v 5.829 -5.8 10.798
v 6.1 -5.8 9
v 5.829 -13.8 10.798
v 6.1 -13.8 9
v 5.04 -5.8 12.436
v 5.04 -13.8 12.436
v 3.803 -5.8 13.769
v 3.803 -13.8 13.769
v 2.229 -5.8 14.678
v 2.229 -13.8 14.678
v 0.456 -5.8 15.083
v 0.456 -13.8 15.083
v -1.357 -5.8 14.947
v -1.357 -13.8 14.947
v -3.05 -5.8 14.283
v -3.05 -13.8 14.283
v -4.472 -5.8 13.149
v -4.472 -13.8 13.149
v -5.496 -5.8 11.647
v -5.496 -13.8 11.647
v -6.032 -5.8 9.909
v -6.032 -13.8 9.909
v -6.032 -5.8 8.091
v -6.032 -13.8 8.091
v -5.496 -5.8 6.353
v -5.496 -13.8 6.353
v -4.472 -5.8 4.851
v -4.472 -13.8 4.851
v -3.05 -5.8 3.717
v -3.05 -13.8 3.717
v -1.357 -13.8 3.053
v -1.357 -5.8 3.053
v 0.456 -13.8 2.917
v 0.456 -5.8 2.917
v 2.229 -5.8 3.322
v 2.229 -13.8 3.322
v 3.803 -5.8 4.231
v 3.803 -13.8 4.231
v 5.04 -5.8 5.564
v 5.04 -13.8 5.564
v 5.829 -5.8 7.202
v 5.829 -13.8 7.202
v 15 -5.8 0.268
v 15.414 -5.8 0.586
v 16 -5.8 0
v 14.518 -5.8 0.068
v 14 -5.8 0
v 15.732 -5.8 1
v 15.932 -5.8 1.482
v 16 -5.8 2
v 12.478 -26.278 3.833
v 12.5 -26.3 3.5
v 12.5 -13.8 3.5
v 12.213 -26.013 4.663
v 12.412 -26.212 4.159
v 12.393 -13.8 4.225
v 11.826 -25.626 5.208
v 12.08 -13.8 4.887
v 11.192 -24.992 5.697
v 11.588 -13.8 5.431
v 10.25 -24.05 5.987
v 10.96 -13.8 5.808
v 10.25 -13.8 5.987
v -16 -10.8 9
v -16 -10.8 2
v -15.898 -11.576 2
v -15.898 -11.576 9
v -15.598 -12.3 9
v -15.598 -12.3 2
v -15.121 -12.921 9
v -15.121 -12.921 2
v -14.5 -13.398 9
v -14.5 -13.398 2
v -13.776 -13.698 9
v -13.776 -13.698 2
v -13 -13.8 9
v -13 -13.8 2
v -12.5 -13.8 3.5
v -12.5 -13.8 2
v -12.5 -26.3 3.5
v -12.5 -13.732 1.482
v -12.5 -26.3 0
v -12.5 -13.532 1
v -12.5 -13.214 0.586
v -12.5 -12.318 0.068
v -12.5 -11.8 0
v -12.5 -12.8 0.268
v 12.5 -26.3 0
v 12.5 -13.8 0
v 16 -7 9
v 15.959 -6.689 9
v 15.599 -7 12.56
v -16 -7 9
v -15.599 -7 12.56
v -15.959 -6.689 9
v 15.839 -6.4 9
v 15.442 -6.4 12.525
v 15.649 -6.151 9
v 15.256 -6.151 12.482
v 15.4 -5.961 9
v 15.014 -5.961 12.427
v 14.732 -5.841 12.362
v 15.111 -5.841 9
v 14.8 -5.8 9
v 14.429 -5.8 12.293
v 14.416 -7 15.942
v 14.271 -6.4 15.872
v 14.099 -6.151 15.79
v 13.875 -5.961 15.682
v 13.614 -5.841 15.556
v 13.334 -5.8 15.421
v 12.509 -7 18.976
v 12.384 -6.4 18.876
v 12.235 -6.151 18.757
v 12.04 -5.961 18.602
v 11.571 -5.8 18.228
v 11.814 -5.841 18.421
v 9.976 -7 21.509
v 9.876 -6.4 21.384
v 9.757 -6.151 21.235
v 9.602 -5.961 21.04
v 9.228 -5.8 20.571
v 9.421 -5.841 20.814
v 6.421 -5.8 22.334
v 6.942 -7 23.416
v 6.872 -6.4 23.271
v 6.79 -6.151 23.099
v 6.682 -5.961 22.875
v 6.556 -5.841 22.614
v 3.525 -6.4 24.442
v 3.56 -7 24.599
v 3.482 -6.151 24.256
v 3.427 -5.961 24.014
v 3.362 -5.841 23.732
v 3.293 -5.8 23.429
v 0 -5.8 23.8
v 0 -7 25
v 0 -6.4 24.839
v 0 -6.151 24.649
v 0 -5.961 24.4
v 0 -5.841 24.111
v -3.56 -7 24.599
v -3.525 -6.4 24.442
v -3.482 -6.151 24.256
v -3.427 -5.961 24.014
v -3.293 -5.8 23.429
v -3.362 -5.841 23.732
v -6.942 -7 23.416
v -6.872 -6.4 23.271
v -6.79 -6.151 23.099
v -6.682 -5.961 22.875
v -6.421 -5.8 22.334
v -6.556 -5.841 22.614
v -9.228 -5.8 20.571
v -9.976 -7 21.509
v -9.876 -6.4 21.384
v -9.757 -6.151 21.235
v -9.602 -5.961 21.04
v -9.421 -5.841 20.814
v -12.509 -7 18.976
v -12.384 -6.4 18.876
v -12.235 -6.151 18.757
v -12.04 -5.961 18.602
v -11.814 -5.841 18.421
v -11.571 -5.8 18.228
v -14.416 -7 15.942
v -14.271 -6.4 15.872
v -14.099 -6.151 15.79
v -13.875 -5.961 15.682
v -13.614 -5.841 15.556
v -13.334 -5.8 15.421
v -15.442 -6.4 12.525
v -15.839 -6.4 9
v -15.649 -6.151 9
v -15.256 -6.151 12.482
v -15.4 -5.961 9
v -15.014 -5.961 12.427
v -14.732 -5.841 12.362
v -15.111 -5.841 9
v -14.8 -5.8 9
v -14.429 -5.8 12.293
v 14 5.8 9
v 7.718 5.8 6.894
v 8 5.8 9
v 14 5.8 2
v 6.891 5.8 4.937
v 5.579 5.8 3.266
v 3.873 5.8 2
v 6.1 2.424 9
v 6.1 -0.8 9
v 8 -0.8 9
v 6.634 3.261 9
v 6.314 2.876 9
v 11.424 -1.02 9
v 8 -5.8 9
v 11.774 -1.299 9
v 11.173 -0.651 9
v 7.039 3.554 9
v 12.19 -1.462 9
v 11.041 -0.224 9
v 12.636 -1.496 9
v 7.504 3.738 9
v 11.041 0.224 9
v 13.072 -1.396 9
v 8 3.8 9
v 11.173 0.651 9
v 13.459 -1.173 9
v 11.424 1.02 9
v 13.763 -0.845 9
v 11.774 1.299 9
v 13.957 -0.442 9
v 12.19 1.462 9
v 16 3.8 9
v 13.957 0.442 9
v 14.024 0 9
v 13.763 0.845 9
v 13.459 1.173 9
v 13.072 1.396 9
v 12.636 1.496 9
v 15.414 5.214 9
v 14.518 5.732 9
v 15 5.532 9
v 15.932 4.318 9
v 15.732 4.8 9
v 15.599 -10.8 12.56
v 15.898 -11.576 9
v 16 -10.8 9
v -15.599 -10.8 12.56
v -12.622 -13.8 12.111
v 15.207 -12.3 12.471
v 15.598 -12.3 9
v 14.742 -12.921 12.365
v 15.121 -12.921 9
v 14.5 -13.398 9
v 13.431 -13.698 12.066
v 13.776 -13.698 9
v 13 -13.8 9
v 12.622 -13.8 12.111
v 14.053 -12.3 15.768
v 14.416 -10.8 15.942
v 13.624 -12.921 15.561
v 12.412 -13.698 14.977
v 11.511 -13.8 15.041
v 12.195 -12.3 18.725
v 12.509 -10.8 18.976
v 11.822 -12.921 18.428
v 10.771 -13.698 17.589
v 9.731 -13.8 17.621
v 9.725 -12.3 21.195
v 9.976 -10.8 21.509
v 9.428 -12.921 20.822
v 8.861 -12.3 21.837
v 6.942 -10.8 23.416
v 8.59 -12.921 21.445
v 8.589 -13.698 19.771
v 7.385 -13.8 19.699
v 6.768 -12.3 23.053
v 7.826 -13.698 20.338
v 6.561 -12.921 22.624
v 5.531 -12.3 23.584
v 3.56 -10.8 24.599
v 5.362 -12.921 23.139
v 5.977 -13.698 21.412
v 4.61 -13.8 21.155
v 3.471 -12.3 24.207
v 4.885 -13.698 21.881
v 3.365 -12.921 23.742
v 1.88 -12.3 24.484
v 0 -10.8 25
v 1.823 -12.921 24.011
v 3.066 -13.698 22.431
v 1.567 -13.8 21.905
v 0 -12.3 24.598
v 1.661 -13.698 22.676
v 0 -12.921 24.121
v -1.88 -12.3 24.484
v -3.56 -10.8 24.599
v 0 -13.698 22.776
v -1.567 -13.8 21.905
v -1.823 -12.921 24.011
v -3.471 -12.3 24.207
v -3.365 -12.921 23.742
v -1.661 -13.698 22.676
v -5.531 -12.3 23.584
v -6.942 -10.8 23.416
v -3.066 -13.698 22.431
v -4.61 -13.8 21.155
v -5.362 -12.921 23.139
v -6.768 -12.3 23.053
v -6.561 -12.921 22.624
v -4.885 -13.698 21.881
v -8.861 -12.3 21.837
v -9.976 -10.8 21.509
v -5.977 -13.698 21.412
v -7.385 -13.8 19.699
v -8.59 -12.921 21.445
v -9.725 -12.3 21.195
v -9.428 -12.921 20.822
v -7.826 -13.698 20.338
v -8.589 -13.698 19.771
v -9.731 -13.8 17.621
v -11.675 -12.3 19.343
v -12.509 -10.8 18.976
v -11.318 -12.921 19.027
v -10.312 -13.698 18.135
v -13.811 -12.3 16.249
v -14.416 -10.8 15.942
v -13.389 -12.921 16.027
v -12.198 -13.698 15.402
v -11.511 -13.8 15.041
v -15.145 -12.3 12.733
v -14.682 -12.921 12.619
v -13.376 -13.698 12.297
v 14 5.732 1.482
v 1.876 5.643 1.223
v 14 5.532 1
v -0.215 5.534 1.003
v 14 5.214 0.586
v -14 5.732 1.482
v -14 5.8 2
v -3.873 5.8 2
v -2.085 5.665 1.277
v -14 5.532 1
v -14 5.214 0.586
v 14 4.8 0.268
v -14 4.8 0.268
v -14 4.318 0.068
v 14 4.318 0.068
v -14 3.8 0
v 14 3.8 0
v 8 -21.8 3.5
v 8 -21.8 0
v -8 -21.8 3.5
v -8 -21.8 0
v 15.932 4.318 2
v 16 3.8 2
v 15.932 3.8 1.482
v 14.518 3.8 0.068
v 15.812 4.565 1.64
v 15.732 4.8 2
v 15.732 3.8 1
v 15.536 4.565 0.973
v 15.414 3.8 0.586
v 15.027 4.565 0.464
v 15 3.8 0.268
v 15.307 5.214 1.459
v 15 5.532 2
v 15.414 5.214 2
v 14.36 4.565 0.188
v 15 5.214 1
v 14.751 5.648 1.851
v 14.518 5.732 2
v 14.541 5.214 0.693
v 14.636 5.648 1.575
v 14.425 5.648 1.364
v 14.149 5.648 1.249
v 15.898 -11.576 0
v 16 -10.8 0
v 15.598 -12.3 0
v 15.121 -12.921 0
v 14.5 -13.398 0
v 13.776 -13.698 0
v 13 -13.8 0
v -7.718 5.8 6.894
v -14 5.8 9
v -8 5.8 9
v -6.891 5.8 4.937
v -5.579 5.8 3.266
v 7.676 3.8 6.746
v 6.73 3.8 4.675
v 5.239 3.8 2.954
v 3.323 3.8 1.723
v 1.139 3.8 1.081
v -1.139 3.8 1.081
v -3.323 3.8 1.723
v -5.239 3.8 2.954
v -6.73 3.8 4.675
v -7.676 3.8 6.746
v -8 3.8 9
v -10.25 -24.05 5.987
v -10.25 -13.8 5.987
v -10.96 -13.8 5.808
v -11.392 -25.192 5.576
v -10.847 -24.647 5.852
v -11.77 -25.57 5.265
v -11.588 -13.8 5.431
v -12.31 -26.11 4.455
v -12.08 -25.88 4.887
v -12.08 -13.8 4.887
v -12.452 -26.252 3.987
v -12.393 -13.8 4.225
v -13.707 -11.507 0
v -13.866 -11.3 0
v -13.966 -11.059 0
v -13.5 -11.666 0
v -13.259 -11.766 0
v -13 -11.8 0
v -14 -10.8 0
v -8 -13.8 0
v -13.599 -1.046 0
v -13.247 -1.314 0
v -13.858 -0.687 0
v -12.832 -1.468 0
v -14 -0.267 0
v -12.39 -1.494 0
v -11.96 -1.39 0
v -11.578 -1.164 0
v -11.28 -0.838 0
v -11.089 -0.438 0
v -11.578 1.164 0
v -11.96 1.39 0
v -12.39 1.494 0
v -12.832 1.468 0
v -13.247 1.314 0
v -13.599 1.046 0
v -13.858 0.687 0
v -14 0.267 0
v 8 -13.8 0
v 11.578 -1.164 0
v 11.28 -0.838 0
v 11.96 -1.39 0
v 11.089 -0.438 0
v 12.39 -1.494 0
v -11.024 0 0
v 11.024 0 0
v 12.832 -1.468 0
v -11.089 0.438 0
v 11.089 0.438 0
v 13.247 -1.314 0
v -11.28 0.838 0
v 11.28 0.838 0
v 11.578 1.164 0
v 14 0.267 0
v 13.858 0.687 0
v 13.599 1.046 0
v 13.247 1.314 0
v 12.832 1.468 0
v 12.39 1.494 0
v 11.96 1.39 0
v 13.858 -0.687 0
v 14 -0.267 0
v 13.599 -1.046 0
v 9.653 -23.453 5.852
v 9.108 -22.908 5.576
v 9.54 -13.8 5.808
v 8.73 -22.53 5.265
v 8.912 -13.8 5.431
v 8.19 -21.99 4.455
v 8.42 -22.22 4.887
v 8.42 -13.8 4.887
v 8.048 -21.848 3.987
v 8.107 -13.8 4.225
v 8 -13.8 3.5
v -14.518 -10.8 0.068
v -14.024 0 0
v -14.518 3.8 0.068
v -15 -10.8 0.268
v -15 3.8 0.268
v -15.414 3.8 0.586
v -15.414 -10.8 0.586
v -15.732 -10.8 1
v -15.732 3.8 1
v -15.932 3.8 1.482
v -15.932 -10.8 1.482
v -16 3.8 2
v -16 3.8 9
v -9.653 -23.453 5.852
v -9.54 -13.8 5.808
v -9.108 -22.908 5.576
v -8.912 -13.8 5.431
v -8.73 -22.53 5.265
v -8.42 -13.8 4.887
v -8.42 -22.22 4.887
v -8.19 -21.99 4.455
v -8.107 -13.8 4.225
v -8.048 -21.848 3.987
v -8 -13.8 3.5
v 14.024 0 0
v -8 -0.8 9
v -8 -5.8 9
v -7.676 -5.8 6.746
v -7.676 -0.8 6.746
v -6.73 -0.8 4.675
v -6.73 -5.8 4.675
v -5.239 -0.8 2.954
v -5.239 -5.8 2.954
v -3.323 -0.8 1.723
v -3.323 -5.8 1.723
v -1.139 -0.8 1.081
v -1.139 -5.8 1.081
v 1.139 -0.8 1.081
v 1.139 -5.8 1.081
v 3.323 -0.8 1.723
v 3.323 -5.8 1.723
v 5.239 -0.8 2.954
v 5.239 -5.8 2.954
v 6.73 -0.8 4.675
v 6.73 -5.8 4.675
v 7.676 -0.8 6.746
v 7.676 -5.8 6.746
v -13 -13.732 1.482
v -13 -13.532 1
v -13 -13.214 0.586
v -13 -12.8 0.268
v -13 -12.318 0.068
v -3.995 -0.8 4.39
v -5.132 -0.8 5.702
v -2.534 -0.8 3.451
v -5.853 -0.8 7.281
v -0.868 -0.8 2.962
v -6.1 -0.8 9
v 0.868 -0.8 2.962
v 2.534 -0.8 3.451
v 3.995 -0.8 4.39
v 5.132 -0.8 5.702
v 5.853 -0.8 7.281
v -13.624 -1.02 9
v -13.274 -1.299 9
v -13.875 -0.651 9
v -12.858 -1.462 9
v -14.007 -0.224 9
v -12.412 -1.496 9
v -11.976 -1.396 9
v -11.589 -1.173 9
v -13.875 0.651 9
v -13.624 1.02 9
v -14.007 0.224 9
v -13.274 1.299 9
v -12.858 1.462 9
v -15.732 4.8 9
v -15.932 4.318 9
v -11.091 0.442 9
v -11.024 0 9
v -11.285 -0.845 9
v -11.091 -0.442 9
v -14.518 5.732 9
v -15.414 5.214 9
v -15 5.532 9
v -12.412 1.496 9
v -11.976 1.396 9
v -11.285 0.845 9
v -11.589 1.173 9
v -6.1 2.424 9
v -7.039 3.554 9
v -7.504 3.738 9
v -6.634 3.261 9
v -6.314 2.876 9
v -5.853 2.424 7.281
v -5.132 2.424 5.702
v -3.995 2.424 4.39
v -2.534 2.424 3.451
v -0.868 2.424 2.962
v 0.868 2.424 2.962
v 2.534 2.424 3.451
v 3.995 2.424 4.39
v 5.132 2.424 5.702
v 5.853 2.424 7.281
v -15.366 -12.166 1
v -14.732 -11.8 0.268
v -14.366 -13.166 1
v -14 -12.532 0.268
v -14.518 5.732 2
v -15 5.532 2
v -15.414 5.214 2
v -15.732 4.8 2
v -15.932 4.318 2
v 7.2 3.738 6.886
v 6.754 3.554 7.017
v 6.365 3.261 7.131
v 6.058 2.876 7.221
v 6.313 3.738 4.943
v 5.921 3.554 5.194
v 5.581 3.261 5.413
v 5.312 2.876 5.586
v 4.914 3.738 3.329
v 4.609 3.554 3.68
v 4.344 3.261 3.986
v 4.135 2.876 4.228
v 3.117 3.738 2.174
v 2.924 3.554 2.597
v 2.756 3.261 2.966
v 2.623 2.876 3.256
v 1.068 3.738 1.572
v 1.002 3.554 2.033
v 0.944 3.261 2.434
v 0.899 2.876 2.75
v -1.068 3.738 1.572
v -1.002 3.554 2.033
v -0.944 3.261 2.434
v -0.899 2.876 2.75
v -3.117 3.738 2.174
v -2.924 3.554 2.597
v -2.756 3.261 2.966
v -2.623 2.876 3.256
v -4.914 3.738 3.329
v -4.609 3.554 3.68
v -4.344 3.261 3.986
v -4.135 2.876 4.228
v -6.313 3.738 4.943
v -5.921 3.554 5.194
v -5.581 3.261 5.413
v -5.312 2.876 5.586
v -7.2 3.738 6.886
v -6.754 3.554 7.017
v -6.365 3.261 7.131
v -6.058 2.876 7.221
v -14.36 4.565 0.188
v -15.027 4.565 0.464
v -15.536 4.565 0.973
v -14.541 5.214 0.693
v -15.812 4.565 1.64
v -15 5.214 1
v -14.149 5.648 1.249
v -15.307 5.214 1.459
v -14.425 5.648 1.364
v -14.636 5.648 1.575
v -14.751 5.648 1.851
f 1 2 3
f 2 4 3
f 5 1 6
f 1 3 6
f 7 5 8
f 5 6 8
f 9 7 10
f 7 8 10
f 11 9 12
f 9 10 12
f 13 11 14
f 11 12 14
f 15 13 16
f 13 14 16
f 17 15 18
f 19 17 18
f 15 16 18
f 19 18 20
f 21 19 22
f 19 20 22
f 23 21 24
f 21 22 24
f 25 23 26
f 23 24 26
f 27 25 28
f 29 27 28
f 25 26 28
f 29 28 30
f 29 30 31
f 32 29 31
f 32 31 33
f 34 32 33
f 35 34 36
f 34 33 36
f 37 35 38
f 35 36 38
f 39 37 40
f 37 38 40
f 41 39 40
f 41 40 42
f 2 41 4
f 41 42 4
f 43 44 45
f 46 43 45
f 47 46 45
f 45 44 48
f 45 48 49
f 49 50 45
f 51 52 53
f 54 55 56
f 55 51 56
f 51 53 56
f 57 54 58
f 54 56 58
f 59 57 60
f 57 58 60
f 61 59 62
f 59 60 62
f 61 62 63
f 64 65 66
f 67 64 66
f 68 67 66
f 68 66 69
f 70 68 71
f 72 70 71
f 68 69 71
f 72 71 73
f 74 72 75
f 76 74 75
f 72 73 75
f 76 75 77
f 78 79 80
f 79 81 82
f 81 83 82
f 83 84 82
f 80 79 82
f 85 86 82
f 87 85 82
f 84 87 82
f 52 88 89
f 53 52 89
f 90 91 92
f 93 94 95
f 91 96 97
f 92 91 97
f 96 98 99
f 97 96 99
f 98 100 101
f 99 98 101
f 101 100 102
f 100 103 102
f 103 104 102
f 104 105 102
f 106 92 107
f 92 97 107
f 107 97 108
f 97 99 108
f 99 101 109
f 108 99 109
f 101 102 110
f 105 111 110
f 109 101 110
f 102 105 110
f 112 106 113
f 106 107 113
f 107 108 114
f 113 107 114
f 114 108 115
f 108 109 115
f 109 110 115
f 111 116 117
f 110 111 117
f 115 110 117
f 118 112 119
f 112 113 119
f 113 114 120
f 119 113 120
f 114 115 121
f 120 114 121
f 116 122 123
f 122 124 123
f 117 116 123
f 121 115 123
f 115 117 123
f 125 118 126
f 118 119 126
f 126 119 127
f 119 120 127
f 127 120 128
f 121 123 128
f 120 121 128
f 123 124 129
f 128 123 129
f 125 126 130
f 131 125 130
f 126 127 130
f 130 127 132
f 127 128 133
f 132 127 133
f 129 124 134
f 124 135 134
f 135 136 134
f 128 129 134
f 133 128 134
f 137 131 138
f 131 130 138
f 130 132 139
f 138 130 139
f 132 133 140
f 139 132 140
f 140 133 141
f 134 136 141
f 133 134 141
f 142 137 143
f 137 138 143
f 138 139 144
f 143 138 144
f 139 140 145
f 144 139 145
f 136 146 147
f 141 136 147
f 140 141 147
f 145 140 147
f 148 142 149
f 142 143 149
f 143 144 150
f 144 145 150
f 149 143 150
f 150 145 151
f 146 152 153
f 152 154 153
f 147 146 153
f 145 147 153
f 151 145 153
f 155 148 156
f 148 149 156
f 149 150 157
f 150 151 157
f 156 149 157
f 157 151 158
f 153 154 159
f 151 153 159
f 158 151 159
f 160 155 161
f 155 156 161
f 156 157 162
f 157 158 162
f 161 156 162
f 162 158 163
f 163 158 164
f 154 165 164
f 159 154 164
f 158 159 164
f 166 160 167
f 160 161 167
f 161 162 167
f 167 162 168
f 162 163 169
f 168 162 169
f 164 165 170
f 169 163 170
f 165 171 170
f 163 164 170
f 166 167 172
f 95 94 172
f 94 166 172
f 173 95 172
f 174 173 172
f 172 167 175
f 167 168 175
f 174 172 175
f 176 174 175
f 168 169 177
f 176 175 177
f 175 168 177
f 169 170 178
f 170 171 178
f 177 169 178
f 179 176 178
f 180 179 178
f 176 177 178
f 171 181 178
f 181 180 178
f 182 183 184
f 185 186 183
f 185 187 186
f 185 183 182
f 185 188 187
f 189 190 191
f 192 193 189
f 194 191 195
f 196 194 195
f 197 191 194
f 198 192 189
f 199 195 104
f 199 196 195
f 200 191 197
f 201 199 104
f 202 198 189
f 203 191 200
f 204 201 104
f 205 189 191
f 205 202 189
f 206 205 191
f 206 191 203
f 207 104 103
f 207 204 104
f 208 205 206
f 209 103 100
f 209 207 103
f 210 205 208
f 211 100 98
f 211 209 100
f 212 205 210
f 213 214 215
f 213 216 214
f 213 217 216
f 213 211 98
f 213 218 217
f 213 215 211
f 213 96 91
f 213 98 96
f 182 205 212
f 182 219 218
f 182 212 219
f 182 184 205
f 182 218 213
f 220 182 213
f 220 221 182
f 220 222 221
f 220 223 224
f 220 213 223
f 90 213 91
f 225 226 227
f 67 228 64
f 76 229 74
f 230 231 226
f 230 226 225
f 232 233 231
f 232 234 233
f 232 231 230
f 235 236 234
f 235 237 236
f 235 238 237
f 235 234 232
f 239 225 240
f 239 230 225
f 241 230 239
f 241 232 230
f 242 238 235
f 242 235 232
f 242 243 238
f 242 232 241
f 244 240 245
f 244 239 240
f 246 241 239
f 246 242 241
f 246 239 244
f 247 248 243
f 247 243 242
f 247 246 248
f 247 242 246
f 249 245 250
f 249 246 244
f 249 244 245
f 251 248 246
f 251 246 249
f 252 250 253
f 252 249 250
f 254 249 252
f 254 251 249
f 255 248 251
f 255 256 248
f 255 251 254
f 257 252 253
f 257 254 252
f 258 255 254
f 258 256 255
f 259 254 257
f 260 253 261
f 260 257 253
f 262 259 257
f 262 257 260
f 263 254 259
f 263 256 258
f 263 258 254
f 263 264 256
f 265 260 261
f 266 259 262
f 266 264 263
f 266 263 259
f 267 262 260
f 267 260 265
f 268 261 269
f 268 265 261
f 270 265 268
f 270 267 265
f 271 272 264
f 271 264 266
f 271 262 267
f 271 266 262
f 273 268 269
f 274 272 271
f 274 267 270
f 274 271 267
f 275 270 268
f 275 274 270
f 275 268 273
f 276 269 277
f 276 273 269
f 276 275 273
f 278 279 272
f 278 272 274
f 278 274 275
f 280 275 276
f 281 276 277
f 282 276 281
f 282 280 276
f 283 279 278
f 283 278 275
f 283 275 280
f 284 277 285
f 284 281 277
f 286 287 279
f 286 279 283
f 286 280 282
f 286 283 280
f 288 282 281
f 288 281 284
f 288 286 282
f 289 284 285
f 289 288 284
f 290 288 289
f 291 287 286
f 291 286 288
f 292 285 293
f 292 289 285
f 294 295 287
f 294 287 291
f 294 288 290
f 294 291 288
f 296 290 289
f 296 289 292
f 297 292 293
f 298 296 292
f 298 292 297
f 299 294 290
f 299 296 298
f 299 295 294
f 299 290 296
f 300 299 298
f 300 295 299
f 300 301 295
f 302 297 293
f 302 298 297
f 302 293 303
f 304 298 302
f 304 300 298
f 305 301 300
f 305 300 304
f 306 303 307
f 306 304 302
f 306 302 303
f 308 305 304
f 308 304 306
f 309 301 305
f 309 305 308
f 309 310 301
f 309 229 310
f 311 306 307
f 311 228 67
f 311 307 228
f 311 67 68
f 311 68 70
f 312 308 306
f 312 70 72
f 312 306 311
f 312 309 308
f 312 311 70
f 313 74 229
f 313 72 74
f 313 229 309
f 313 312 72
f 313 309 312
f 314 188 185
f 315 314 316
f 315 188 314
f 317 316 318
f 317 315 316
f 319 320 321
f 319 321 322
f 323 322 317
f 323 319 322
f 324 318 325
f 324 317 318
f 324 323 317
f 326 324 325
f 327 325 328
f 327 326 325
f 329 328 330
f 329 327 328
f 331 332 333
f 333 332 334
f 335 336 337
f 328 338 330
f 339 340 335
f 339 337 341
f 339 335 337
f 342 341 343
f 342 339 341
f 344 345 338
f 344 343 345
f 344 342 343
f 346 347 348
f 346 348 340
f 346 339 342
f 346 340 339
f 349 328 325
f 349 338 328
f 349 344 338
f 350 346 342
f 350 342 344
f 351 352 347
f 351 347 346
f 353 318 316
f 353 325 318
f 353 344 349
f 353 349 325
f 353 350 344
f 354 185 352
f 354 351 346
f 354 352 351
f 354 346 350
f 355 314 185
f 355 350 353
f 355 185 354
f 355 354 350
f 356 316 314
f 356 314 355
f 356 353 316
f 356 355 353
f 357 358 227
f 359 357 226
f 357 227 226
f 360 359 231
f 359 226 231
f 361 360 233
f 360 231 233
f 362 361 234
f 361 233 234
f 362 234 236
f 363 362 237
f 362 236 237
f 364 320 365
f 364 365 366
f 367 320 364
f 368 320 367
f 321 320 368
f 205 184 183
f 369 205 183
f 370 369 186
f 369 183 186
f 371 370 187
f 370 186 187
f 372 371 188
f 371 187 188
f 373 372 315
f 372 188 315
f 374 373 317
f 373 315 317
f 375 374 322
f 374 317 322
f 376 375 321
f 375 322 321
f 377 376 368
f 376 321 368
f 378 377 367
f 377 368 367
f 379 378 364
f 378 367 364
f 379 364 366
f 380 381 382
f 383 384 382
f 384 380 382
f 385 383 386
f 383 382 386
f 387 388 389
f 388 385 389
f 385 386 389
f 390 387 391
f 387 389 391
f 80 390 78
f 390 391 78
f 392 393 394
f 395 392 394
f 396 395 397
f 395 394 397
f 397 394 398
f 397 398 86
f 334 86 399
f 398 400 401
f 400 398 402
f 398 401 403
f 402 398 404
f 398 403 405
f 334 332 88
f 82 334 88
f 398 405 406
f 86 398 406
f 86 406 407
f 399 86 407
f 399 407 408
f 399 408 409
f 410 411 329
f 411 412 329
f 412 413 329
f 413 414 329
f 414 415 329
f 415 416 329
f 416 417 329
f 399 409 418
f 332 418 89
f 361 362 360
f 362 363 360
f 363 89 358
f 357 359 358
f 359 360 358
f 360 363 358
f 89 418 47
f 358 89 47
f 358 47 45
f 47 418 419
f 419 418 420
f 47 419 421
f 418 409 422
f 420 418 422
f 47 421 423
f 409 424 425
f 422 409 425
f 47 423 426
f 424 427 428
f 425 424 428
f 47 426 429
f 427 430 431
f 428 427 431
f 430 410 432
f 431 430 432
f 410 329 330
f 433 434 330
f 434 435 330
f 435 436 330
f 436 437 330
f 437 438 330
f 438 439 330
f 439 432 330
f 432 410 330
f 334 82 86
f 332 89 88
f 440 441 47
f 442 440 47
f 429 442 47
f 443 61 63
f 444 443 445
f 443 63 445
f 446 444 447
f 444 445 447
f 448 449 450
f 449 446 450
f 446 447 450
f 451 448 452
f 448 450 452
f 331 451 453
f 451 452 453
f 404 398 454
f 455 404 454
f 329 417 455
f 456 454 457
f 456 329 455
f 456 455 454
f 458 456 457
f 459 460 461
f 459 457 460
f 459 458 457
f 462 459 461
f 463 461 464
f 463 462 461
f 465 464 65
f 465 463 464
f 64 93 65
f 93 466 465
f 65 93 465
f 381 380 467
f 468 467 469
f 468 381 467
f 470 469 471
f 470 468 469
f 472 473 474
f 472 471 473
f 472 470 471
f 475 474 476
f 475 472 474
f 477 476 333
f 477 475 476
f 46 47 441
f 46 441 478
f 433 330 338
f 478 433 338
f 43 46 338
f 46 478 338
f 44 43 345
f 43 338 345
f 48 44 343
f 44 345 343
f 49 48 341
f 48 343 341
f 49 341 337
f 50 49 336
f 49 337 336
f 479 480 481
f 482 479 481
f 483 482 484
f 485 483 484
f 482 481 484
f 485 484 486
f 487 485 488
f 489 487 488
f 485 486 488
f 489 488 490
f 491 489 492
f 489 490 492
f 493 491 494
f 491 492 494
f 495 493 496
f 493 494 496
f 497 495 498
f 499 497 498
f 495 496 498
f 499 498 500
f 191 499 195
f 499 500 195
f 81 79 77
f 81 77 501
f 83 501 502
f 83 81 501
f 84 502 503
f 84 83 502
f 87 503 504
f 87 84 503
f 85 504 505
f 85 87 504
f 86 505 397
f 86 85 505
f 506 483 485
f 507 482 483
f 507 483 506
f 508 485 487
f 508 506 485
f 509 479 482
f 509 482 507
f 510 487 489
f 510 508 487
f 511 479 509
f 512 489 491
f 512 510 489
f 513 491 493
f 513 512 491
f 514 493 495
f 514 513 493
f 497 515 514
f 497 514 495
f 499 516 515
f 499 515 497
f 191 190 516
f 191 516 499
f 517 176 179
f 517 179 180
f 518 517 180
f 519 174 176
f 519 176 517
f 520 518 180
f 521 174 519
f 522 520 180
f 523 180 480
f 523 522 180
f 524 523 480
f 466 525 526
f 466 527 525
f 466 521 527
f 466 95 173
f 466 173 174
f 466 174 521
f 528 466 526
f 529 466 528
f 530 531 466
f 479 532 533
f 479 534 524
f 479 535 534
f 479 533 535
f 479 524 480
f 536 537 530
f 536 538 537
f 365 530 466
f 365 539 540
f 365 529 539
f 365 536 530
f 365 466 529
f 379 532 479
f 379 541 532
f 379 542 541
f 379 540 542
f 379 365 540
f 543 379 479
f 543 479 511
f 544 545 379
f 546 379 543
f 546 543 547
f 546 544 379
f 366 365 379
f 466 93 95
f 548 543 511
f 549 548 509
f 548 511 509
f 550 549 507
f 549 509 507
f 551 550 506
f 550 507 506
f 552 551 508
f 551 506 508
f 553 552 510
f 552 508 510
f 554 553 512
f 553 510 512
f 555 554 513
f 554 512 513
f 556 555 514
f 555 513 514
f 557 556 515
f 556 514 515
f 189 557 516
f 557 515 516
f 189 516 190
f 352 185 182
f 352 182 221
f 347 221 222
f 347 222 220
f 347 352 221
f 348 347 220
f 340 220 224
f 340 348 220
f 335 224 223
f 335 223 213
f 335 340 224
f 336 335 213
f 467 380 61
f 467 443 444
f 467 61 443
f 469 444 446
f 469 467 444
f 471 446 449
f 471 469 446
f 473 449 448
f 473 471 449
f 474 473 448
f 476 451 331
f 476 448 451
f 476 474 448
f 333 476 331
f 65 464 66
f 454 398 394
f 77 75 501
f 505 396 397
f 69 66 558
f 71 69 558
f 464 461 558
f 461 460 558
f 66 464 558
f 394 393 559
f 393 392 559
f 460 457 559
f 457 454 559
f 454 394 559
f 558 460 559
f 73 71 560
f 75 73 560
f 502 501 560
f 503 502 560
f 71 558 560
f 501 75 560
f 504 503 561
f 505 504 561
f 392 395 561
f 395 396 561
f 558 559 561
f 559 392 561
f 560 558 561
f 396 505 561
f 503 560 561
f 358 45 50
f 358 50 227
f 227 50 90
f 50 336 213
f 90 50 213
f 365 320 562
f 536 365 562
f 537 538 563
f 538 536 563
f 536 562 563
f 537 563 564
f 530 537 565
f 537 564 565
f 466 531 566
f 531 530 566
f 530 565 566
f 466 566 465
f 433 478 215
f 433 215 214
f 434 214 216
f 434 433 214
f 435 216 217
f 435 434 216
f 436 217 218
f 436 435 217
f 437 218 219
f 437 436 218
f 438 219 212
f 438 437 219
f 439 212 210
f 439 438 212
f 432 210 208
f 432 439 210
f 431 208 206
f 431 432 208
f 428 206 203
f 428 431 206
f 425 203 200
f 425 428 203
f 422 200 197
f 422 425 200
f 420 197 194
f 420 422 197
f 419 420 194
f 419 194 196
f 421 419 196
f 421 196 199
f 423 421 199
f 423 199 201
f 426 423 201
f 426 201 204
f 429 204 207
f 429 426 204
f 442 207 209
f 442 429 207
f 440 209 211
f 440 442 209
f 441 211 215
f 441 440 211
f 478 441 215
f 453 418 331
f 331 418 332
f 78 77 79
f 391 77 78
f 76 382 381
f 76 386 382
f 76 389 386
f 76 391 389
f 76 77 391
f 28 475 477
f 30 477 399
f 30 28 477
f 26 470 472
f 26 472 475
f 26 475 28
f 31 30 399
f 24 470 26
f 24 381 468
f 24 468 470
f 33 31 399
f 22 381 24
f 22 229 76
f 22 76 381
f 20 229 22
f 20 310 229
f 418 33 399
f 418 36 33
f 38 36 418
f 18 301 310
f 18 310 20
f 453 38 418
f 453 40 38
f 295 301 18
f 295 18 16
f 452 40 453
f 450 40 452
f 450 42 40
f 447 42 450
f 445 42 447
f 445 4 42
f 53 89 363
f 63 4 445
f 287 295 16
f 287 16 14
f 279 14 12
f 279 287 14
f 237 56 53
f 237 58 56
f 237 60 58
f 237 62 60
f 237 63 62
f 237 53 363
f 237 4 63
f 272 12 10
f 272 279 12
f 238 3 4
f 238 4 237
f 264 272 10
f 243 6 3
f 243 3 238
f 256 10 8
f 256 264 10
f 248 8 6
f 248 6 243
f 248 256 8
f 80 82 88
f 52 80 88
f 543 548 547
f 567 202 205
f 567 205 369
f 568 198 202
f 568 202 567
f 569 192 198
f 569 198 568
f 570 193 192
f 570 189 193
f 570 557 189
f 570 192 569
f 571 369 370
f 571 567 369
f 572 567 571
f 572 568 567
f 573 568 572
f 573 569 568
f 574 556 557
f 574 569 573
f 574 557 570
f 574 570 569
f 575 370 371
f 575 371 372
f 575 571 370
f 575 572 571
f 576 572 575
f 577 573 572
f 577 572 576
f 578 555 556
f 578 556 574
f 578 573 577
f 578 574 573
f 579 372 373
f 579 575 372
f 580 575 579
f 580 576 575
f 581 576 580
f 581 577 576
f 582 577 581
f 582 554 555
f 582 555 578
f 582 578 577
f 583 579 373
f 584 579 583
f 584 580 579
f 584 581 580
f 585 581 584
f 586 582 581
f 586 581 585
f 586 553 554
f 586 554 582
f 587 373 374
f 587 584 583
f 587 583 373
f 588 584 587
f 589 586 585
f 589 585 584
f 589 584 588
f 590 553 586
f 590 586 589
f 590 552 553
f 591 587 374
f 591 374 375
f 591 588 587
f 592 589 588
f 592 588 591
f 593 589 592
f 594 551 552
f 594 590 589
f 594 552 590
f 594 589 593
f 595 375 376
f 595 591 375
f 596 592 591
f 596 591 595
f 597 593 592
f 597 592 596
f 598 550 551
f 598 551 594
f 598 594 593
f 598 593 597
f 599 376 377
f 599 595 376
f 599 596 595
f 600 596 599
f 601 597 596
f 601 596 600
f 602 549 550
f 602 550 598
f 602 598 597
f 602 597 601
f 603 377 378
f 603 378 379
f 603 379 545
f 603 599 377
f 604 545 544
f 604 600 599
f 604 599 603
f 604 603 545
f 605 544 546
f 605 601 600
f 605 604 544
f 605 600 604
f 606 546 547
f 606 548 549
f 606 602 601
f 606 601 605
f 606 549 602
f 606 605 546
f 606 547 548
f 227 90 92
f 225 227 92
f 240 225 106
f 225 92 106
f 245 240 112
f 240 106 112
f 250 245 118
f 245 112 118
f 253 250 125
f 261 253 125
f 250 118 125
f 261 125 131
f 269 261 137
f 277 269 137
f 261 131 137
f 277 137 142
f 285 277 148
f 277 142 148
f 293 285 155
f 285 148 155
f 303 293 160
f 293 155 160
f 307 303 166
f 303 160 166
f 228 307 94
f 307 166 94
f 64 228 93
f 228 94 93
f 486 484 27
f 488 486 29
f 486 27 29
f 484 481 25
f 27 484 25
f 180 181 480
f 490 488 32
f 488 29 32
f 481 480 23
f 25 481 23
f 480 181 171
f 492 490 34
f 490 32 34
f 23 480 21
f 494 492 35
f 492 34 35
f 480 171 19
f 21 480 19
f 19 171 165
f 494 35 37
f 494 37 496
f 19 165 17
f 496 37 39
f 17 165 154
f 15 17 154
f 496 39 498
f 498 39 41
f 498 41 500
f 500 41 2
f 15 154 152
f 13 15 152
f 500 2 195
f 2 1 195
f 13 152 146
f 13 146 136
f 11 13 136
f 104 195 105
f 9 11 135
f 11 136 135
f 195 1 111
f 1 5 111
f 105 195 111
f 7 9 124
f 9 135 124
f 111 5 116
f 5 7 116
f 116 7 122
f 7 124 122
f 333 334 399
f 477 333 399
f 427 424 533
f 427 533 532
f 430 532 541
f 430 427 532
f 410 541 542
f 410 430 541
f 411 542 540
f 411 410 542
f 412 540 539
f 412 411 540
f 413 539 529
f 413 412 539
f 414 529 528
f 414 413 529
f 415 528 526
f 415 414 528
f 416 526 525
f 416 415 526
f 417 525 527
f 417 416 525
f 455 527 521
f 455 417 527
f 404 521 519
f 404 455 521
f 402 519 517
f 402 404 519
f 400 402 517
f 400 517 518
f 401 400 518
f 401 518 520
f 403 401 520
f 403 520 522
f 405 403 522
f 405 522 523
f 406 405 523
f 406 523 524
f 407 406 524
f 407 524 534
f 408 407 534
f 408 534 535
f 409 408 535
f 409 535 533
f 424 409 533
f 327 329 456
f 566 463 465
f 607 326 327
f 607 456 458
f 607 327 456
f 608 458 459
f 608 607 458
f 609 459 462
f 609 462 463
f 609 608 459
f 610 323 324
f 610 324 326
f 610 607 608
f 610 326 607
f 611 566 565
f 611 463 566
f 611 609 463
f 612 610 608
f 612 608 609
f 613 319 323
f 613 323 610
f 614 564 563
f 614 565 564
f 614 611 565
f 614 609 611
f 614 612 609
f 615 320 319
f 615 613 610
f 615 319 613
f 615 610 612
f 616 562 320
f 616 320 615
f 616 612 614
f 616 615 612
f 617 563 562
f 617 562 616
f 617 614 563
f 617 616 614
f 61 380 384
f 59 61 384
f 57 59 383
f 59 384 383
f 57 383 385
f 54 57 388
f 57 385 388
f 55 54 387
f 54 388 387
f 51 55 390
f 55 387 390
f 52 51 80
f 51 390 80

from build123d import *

# Parameters (mm, degrees)
F0_W          = 32
F0_H          = 11.6
F0_R          = 1.5
F1_DEPTH      = 9
F2_R          = 8
F1_FACE1_W    = 32
F1_FACE1_H    = 9
F3_DEPTH      = 5
F4_R          = 8
F5_DEPTH      = 2
F6_R          = 6
F7_DEPTH      = 25
F8_T1_DEPTH   = 28
F8_T3_DEPTH   = 12
F8_T5_DEPTH   = 14.6
F8_S9_W       = 2
F8_S9_H       = 2
F8_T10_DEPTH  = 2
F8_S15_W      = 2
F8_S15_H      = 2
F8_T16_DEPTH  = 2
F8_T20_ANGLE  = 275.6465366004
F10_DEPTH     = 8
F12_DEPTH     = 6
F13_T1_DEPTH  = 8
F13_T3_DEPTH  = 18.75
F13_T5_DEPTH  = 16
F13_T7_DEPTH  = 37.5
F13_T13_DEPTH = 14.25
F13_T17_DEPTH = 22.25
F13_T24_DEPTH = 14.25
F13_T28_DEPTH = 22.25
F14_R         = 3
F15_R         = 1.2
F16_R         = 6.1
F17_DEPTH     = 19.6010001
F18_T3_ANGLE  = 90
F18_T6_DEPTH  = 10
F18_T9_DEPTH  = 0.5


# Not quite as in the source:
# - a fillet or chamfer that OpenCascade refuses, or shapes differently, is made with other operations: its cross-section is extruded or revolved along the edge and cut away or added


with BuildPart() as f1:
    # F0 (on Top) → F1 (new body)
    with BuildSketch(Plane.XY):
        Rectangle(F0_W, F0_H)
        with Locations((-12.524, 0)):
            Circle(F0_R, mode=Mode.SUBTRACT)
        with Locations((12.524, 0)):
            Circle(F0_R, mode=Mode.SUBTRACT)
    extrude(amount=F1_DEPTH)

    # F2 (on face) + F1_face1 (on face) → F3 (cut)
    with BuildSketch(Plane.XZ.offset(5.8)):
        with Locations((0, 9)):
            Circle(F2_R)
    with BuildSketch(Plane(origin=(0, 5.8, 4.5), x_dir=(-1, 0, 0), z_dir=(0, 1, 0))):
        Rectangle(F1_FACE1_W, F1_FACE1_H)
    extrude(amount=-F3_DEPTH, dir=(0, -1, 0), mode=Mode.SUBTRACT)

    # F4 (on face) → F5 (cut)
    with BuildSketch(Plane(origin=(0, 5.8, 0), x_dir=(-1, 0, 0), z_dir=(0, 1, 0))):
        with Locations((0, 9)):
            Circle(F4_R)
    extrude(amount=-F5_DEPTH, mode=Mode.SUBTRACT)

    # F6 (on face) → F7 (cut)
    with BuildSketch(Plane(origin=(0, 3.8, 0), x_dir=(-1, 0, 0), z_dir=(0, 1, 0))):
        with Locations((0, 9)):
            Circle(F6_R)
    extrude(amount=-F7_DEPTH, mode=Mode.SUBTRACT)

    # F8: fillet of radius 2 on 6 edges, made by hand

    # F8_s2 → F8_t1 (cut)
    with BuildSketch(Plane.YZ.offset(-14)):
        with BuildLine():
            ThreePointArc((5.8, 2), (5.2142135624, 0.5857864376), (3.8, 0))
            Line((3.8, 0), (5.8, 0))
            Line((5.8, 0), (5.8, 2))
        make_face()
    extrude(amount=F8_T1_DEPTH, mode=Mode.SUBTRACT)

    # F8_s4 → F8_t3 (cut)
    with BuildSketch(Plane.XY.offset(2)):
        with BuildLine():
            ThreePointArc((-14, 5.8), (-15.4142135624, 5.2142135624), (-16, 3.8))
            Line((-16, 3.8), (-16, 5.8))
            Line((-16, 5.8), (-14, 5.8))
        make_face()
        with BuildLine():
            ThreePointArc((14, 5.8), (15.4142135624, 5.2142135624), (16, 3.8))
            Line((16, 3.8), (16, 5.8))
            Line((16, 5.8), (14, 5.8))
        make_face()
    extrude(amount=F8_T3_DEPTH, mode=Mode.SUBTRACT)

    # F8_s6 → F8_t5 (cut)
    with BuildSketch(Plane.XZ.offset(-3.8)):
        with BuildLine():
            ThreePointArc((-14, 0), (-15.4142135624, 0.5857864376), (-16, 2))
            Line((-16, 2), (-16, 0))
            Line((-16, 0), (-14, 0))
        make_face()
        with BuildLine():
            ThreePointArc((14, 0), (15.4142135624, 0.5857864376), (16, 2))
            Line((16, 2), (16, 0))
            Line((16, 0), (14, 0))
        make_face()
    extrude(amount=F8_T5_DEPTH, mode=Mode.SUBTRACT)


with BuildPart() as f8_tool8:
    # F8_s9 → F8_t10 (new body)
    with BuildSketch(Plane.XZ.offset(-3.8)):
        with Locations((15, 1)):
            Rectangle(F8_S9_W, F8_S9_H)
    extrude(amount=-F8_T10_DEPTH)

    # F8_s11 → F8_t12 (revolve, cut)
    with BuildSketch(Plane(origin=(14, 3.8, 2), x_dir=(-0.7071067812, 0, 0.7071067812), z_dir=(-0.7071067812, 0, -0.7071067812))):
        with BuildLine():
            ThreePointArc((0, -2), (2, 0), (0, 2))
            Line((0, 2), (0, -2))
        make_face()
    revolve(axis=Axis((14, 3.8, 2), (0, 1, 0)), mode=Mode.SUBTRACT)


with BuildPart() as f1_1:
    add(f1.part)

    # F8_t7: cut F8_tool8
    add(f8_tool8.part, mode=Mode.SUBTRACT)


with BuildPart() as f8_tool14:
    # F8_s15 → F8_t16 (new body)
    with BuildSketch(Plane.XZ.offset(-3.8)):
        with Locations((-15, 1)):
            Rectangle(F8_S15_W, F8_S15_H)
    extrude(amount=-F8_T16_DEPTH)

    # F8_s17 → F8_t18 (revolve, cut)
    with BuildSketch(Plane(origin=(-14, 3.8, 2), x_dir=(0.7071067812, 0, 0.7071067812), z_dir=(-0.7071067812, 0, 0.7071067812))):
        with BuildLine():
            ThreePointArc((0, -2), (2, 0), (0, 2))
            Line((0, 2), (0, -2))
        make_face()
    revolve(axis=Axis((-14, 3.8, 2), (0, 1, 0)), mode=Mode.SUBTRACT)


with BuildPart() as f1_2:
    add(f1_1.part)

    # F8_t13: cut F8_tool14
    add(f8_tool14.part, mode=Mode.SUBTRACT)

    # F8_s19 → F8_t20 (revolve, cut)
    with BuildSketch(Plane(origin=(-4.4781651596, 0, 4.057239564), x_dir=(0, 1, 0), z_dir=(-0.7410773266, 0, 0.6714196869))):
        with BuildLine():
            ThreePointArc((3.8, -14.6696959394), (3.2142135624, -13.255482377), (1.8, -12.6696959394))
            Line((1.8, -12.6696959394), (3.8, -12.6696959394))
            Line((3.8, -12.6696959394), (3.8, -14.6696959394))
        make_face()
    revolve(axis=Axis((0, 3.8, 9), (0, 1, 0)), revolution_arc=F8_T20_ANGLE, mode=Mode.SUBTRACT)

    # F9 (on face) → F10 (join)
    with BuildSketch(Plane.XZ.offset(5.8)):
        with BuildLine():
            Line((16, 0), (16, 9))
            ThreePointArc((16, 9), (0, 25), (-16, 9))
            Line((-16, 9), (-16, 0))
            Line((-16, 0), (-13.2287565553, 0))
            Line((-13.2287565553, 0), (0, 0))
            Line((0, 0), (13.2287565553, 0))
            Line((13.2287565553, 0), (16, 0))
        make_face()
    extrude(amount=F10_DEPTH)

    # F11 (on Top) → F12 (join)
    with BuildSketch(Plane.XY):
        Polygon((-8, -21.8), (-8, -13.8), (-12.5, -13.8), (-12.5, -26.3), (12.5, -26.3), (12.5, -13.8), (8, -13.8), (8, -21.8), align=None)
    extrude(amount=F12_DEPTH)

    # F13: fillet of radius 2.5 on 6 edges, made by hand

    # F13_s2 → F13_t1 (cut)
    with BuildSketch(Plane.XZ.offset(13.8)):
        with BuildLine():
            ThreePointArc((-10.5, 6), (-8.732233047, 5.267766953), (-8, 3.5))
            Line((-8, 3.5), (-8, 6))
            Line((-8, 6), (-10.5, 6))
        make_face()
        with BuildLine():
            ThreePointArc((10.5, 6), (8.732233047, 5.267766953), (8, 3.5))
            Line((8, 3.5), (8, 6))
            Line((8, 6), (10.5, 6))
        make_face()
    extrude(amount=F13_T1_DEPTH, mode=Mode.SUBTRACT)

    # F13_s4 → F13_t3 (cut)
    with BuildSketch(Plane.XZ.offset(13.8)):
        with BuildLine():
            ThreePointArc((-10, 6), (-11.767766953, 5.267766953), (-12.5, 3.5))
            Line((-12.5, 3.5), (-12.5, 6))
            Line((-12.5, 6), (-10, 6))
        make_face()
        with BuildLine():
            ThreePointArc((12.5, 3.5), (11.767766953, 5.267766953), (10, 6))
            Line((10, 6), (12.5, 6))
            Line((12.5, 6), (12.5, 3.5))
        make_face()
    extrude(amount=F13_T3_DEPTH, mode=Mode.SUBTRACT)

    # F13_s6 → F13_t5 (cut)
    with BuildSketch(Plane.YZ.offset(-8)):
        with BuildLine():
            ThreePointArc((-24.3, 6), (-22.532233047, 5.267766953), (-21.8, 3.5))
            Line((-21.8, 3.5), (-21.8, 6))
            Line((-21.8, 6), (-24.3, 6))
        make_face()
    extrude(amount=F13_T5_DEPTH, mode=Mode.SUBTRACT)

    # F13_s8 → F13_t7 (cut)
    with BuildSketch(Plane.YZ.offset(-18.75)):
        with BuildLine():
            ThreePointArc((-23.8, 6), (-25.567766953, 5.267766953), (-26.3, 3.5))
            Line((-26.3, 3.5), (-26.3, 6))
            Line((-26.3, 6), (-23.8, 6))
        make_face()
    extrude(amount=F13_T7_DEPTH, mode=Mode.SUBTRACT)


with BuildPart() as f13_tool11:
    # F13_s12 → F13_t13 (new body)
    with BuildSketch(Plane.XZ.offset(28.05)):
        with BuildLine():
            ThreePointArc((-10.5, 6), (-8.732233047, 5.267766953), (-8, 3.5))
            Line((-8, 3.5), (-8, 6))
            Line((-8, 6), (-10.5, 6))
        make_face()
    extrude(amount=-F13_T13_DEPTH)

    split(bisect_by=Plane.XZ.offset(21.8), keep=Keep.TOP)


with BuildPart() as f13_tool15:
    # F13_s16 → F13_t17 (new body)
    with BuildSketch(Plane.YZ.offset(8)):
        with BuildLine():
            ThreePointArc((-24.3, 6), (-22.532233047, 5.267766953), (-21.8, 3.5))
            Line((-21.8, 3.5), (-21.8, 6))
            Line((-21.8, 6), (-24.3, 6))
        make_face()
    extrude(amount=-F13_T17_DEPTH)

    split(bisect_by=Plane.YZ.offset(-8), keep=Keep.BOTTOM)


with BuildPart() as f13_tool11_1:
    add(f13_tool11.part)

    # F13_t19: intersect F13_tool15
    add(f13_tool15.part, mode=Mode.INTERSECT)


with BuildPart() as f1_3:
    add(f1_2.part)

    # F13_t9: cut F13_tool11
    add(f13_tool11_1.part, mode=Mode.SUBTRACT)


with BuildPart() as f13_tool22:
    # F13_s23 → F13_t24 (new body)
    with BuildSketch(Plane.XZ.offset(13.8)):
        with BuildLine():
            ThreePointArc((10.5, 6), (8.732233047, 5.267766953), (8, 3.5))
            Line((8, 3.5), (8, 6))
            Line((8, 6), (10.5, 6))
        make_face()
    extrude(amount=F13_T24_DEPTH)

    split(bisect_by=Plane.XZ.offset(21.8), keep=Keep.TOP)


with BuildPart() as f13_tool26:
    # F13_s27 → F13_t28 (new body)
    with BuildSketch(Plane.YZ.offset(14.25)):
        with BuildLine():
            ThreePointArc((-24.3, 6), (-22.532233047, 5.267766953), (-21.8, 3.5))
            Line((-21.8, 3.5), (-21.8, 6))
            Line((-21.8, 6), (-24.3, 6))
        make_face()
    extrude(amount=-F13_T28_DEPTH)

    split(bisect_by=Plane.YZ.offset(8), keep=Keep.TOP)


with BuildPart() as f13_tool22_1:
    add(f13_tool22.part)

    # F13_t30: intersect F13_tool26
    add(f13_tool26.part, mode=Mode.INTERSECT)


with BuildPart() as f1_4:
    add(f1_3.part)

    # F13_t20: cut F13_tool22
    add(f13_tool22_1.part, mode=Mode.SUBTRACT)

    # F14
    f14_edges = [f1_4.edges().sort_by_distance(p)[0] for p in [
        (0, -13.8, 25),
        (16, -13.8, 4.5),
    ]]
    fillet(f14_edges, radius=F14_R)

    # F15
    f15_edges = [f1_4.edges().sort_by_distance(p)[0] for p in [
        (0, -5.8, 25),
    ]]
    fillet(f15_edges, radius=F15_R)

    # F16 (on face) → F17 (cut, through all)
    with BuildSketch(Plane.XZ.offset(13.8)):
        with Locations((0, 9)):
            Circle(F16_R)
    extrude(amount=-F17_DEPTH, mode=Mode.SUBTRACT)

    # F18: fillet of radius 2 on 3 edges, made by hand


with BuildPart() as f18_tool1:
    # F18_s2 → F18_t3 (revolve)
    with BuildSketch(Plane.XZ.offset(10.8)):
        with BuildLine():
            ThreePointArc((-16, 2), (-15.4142135624, 0.5857864376), (-14, 0))
            Line((-14, 0), (-16, 0))
            Line((-16, 0), (-16, 2))
        make_face()
    revolve(axis=Axis((-13, -10.8, 0), (0, 0, 1)), revolution_arc=F18_T3_ANGLE)


with BuildPart() as f18_tool4:
    # F18_s5 → F18_t6 (new body)
    with BuildSketch(Plane.XZ.offset(0.8)):
        with BuildLine():
            ThreePointArc((-16, 2), (-15.4142135624, 0.5857864376), (-14, 0))
            Line((-14, 0), (-16, 0))
            Line((-16, 0), (-16, 2))
        make_face()
    extrude(amount=F18_T6_DEPTH)


with BuildPart() as f18_tool7:
    # F18_s8 → F18_t9 (new body)
    with BuildSketch(Plane.YZ.offset(-12.5)):
        with BuildLine():
            ThreePointArc((-13.8, 2), (-13.2142135624, 0.5857864376), (-11.8, 0))
            Line((-11.8, 0), (-13.8, 0))
            Line((-13.8, 0), (-13.8, 2))
        make_face()
    extrude(amount=-F18_T9_DEPTH)


with BuildPart() as f1_5:
    add(f1_4.part)

    # F18_t10: cut F18_tool1, F18_tool4, F18_tool7
    add([f18_tool1.part, f18_tool4.part, f18_tool7.part], mode=Mode.SUBTRACT)


solid = f1_5.part
